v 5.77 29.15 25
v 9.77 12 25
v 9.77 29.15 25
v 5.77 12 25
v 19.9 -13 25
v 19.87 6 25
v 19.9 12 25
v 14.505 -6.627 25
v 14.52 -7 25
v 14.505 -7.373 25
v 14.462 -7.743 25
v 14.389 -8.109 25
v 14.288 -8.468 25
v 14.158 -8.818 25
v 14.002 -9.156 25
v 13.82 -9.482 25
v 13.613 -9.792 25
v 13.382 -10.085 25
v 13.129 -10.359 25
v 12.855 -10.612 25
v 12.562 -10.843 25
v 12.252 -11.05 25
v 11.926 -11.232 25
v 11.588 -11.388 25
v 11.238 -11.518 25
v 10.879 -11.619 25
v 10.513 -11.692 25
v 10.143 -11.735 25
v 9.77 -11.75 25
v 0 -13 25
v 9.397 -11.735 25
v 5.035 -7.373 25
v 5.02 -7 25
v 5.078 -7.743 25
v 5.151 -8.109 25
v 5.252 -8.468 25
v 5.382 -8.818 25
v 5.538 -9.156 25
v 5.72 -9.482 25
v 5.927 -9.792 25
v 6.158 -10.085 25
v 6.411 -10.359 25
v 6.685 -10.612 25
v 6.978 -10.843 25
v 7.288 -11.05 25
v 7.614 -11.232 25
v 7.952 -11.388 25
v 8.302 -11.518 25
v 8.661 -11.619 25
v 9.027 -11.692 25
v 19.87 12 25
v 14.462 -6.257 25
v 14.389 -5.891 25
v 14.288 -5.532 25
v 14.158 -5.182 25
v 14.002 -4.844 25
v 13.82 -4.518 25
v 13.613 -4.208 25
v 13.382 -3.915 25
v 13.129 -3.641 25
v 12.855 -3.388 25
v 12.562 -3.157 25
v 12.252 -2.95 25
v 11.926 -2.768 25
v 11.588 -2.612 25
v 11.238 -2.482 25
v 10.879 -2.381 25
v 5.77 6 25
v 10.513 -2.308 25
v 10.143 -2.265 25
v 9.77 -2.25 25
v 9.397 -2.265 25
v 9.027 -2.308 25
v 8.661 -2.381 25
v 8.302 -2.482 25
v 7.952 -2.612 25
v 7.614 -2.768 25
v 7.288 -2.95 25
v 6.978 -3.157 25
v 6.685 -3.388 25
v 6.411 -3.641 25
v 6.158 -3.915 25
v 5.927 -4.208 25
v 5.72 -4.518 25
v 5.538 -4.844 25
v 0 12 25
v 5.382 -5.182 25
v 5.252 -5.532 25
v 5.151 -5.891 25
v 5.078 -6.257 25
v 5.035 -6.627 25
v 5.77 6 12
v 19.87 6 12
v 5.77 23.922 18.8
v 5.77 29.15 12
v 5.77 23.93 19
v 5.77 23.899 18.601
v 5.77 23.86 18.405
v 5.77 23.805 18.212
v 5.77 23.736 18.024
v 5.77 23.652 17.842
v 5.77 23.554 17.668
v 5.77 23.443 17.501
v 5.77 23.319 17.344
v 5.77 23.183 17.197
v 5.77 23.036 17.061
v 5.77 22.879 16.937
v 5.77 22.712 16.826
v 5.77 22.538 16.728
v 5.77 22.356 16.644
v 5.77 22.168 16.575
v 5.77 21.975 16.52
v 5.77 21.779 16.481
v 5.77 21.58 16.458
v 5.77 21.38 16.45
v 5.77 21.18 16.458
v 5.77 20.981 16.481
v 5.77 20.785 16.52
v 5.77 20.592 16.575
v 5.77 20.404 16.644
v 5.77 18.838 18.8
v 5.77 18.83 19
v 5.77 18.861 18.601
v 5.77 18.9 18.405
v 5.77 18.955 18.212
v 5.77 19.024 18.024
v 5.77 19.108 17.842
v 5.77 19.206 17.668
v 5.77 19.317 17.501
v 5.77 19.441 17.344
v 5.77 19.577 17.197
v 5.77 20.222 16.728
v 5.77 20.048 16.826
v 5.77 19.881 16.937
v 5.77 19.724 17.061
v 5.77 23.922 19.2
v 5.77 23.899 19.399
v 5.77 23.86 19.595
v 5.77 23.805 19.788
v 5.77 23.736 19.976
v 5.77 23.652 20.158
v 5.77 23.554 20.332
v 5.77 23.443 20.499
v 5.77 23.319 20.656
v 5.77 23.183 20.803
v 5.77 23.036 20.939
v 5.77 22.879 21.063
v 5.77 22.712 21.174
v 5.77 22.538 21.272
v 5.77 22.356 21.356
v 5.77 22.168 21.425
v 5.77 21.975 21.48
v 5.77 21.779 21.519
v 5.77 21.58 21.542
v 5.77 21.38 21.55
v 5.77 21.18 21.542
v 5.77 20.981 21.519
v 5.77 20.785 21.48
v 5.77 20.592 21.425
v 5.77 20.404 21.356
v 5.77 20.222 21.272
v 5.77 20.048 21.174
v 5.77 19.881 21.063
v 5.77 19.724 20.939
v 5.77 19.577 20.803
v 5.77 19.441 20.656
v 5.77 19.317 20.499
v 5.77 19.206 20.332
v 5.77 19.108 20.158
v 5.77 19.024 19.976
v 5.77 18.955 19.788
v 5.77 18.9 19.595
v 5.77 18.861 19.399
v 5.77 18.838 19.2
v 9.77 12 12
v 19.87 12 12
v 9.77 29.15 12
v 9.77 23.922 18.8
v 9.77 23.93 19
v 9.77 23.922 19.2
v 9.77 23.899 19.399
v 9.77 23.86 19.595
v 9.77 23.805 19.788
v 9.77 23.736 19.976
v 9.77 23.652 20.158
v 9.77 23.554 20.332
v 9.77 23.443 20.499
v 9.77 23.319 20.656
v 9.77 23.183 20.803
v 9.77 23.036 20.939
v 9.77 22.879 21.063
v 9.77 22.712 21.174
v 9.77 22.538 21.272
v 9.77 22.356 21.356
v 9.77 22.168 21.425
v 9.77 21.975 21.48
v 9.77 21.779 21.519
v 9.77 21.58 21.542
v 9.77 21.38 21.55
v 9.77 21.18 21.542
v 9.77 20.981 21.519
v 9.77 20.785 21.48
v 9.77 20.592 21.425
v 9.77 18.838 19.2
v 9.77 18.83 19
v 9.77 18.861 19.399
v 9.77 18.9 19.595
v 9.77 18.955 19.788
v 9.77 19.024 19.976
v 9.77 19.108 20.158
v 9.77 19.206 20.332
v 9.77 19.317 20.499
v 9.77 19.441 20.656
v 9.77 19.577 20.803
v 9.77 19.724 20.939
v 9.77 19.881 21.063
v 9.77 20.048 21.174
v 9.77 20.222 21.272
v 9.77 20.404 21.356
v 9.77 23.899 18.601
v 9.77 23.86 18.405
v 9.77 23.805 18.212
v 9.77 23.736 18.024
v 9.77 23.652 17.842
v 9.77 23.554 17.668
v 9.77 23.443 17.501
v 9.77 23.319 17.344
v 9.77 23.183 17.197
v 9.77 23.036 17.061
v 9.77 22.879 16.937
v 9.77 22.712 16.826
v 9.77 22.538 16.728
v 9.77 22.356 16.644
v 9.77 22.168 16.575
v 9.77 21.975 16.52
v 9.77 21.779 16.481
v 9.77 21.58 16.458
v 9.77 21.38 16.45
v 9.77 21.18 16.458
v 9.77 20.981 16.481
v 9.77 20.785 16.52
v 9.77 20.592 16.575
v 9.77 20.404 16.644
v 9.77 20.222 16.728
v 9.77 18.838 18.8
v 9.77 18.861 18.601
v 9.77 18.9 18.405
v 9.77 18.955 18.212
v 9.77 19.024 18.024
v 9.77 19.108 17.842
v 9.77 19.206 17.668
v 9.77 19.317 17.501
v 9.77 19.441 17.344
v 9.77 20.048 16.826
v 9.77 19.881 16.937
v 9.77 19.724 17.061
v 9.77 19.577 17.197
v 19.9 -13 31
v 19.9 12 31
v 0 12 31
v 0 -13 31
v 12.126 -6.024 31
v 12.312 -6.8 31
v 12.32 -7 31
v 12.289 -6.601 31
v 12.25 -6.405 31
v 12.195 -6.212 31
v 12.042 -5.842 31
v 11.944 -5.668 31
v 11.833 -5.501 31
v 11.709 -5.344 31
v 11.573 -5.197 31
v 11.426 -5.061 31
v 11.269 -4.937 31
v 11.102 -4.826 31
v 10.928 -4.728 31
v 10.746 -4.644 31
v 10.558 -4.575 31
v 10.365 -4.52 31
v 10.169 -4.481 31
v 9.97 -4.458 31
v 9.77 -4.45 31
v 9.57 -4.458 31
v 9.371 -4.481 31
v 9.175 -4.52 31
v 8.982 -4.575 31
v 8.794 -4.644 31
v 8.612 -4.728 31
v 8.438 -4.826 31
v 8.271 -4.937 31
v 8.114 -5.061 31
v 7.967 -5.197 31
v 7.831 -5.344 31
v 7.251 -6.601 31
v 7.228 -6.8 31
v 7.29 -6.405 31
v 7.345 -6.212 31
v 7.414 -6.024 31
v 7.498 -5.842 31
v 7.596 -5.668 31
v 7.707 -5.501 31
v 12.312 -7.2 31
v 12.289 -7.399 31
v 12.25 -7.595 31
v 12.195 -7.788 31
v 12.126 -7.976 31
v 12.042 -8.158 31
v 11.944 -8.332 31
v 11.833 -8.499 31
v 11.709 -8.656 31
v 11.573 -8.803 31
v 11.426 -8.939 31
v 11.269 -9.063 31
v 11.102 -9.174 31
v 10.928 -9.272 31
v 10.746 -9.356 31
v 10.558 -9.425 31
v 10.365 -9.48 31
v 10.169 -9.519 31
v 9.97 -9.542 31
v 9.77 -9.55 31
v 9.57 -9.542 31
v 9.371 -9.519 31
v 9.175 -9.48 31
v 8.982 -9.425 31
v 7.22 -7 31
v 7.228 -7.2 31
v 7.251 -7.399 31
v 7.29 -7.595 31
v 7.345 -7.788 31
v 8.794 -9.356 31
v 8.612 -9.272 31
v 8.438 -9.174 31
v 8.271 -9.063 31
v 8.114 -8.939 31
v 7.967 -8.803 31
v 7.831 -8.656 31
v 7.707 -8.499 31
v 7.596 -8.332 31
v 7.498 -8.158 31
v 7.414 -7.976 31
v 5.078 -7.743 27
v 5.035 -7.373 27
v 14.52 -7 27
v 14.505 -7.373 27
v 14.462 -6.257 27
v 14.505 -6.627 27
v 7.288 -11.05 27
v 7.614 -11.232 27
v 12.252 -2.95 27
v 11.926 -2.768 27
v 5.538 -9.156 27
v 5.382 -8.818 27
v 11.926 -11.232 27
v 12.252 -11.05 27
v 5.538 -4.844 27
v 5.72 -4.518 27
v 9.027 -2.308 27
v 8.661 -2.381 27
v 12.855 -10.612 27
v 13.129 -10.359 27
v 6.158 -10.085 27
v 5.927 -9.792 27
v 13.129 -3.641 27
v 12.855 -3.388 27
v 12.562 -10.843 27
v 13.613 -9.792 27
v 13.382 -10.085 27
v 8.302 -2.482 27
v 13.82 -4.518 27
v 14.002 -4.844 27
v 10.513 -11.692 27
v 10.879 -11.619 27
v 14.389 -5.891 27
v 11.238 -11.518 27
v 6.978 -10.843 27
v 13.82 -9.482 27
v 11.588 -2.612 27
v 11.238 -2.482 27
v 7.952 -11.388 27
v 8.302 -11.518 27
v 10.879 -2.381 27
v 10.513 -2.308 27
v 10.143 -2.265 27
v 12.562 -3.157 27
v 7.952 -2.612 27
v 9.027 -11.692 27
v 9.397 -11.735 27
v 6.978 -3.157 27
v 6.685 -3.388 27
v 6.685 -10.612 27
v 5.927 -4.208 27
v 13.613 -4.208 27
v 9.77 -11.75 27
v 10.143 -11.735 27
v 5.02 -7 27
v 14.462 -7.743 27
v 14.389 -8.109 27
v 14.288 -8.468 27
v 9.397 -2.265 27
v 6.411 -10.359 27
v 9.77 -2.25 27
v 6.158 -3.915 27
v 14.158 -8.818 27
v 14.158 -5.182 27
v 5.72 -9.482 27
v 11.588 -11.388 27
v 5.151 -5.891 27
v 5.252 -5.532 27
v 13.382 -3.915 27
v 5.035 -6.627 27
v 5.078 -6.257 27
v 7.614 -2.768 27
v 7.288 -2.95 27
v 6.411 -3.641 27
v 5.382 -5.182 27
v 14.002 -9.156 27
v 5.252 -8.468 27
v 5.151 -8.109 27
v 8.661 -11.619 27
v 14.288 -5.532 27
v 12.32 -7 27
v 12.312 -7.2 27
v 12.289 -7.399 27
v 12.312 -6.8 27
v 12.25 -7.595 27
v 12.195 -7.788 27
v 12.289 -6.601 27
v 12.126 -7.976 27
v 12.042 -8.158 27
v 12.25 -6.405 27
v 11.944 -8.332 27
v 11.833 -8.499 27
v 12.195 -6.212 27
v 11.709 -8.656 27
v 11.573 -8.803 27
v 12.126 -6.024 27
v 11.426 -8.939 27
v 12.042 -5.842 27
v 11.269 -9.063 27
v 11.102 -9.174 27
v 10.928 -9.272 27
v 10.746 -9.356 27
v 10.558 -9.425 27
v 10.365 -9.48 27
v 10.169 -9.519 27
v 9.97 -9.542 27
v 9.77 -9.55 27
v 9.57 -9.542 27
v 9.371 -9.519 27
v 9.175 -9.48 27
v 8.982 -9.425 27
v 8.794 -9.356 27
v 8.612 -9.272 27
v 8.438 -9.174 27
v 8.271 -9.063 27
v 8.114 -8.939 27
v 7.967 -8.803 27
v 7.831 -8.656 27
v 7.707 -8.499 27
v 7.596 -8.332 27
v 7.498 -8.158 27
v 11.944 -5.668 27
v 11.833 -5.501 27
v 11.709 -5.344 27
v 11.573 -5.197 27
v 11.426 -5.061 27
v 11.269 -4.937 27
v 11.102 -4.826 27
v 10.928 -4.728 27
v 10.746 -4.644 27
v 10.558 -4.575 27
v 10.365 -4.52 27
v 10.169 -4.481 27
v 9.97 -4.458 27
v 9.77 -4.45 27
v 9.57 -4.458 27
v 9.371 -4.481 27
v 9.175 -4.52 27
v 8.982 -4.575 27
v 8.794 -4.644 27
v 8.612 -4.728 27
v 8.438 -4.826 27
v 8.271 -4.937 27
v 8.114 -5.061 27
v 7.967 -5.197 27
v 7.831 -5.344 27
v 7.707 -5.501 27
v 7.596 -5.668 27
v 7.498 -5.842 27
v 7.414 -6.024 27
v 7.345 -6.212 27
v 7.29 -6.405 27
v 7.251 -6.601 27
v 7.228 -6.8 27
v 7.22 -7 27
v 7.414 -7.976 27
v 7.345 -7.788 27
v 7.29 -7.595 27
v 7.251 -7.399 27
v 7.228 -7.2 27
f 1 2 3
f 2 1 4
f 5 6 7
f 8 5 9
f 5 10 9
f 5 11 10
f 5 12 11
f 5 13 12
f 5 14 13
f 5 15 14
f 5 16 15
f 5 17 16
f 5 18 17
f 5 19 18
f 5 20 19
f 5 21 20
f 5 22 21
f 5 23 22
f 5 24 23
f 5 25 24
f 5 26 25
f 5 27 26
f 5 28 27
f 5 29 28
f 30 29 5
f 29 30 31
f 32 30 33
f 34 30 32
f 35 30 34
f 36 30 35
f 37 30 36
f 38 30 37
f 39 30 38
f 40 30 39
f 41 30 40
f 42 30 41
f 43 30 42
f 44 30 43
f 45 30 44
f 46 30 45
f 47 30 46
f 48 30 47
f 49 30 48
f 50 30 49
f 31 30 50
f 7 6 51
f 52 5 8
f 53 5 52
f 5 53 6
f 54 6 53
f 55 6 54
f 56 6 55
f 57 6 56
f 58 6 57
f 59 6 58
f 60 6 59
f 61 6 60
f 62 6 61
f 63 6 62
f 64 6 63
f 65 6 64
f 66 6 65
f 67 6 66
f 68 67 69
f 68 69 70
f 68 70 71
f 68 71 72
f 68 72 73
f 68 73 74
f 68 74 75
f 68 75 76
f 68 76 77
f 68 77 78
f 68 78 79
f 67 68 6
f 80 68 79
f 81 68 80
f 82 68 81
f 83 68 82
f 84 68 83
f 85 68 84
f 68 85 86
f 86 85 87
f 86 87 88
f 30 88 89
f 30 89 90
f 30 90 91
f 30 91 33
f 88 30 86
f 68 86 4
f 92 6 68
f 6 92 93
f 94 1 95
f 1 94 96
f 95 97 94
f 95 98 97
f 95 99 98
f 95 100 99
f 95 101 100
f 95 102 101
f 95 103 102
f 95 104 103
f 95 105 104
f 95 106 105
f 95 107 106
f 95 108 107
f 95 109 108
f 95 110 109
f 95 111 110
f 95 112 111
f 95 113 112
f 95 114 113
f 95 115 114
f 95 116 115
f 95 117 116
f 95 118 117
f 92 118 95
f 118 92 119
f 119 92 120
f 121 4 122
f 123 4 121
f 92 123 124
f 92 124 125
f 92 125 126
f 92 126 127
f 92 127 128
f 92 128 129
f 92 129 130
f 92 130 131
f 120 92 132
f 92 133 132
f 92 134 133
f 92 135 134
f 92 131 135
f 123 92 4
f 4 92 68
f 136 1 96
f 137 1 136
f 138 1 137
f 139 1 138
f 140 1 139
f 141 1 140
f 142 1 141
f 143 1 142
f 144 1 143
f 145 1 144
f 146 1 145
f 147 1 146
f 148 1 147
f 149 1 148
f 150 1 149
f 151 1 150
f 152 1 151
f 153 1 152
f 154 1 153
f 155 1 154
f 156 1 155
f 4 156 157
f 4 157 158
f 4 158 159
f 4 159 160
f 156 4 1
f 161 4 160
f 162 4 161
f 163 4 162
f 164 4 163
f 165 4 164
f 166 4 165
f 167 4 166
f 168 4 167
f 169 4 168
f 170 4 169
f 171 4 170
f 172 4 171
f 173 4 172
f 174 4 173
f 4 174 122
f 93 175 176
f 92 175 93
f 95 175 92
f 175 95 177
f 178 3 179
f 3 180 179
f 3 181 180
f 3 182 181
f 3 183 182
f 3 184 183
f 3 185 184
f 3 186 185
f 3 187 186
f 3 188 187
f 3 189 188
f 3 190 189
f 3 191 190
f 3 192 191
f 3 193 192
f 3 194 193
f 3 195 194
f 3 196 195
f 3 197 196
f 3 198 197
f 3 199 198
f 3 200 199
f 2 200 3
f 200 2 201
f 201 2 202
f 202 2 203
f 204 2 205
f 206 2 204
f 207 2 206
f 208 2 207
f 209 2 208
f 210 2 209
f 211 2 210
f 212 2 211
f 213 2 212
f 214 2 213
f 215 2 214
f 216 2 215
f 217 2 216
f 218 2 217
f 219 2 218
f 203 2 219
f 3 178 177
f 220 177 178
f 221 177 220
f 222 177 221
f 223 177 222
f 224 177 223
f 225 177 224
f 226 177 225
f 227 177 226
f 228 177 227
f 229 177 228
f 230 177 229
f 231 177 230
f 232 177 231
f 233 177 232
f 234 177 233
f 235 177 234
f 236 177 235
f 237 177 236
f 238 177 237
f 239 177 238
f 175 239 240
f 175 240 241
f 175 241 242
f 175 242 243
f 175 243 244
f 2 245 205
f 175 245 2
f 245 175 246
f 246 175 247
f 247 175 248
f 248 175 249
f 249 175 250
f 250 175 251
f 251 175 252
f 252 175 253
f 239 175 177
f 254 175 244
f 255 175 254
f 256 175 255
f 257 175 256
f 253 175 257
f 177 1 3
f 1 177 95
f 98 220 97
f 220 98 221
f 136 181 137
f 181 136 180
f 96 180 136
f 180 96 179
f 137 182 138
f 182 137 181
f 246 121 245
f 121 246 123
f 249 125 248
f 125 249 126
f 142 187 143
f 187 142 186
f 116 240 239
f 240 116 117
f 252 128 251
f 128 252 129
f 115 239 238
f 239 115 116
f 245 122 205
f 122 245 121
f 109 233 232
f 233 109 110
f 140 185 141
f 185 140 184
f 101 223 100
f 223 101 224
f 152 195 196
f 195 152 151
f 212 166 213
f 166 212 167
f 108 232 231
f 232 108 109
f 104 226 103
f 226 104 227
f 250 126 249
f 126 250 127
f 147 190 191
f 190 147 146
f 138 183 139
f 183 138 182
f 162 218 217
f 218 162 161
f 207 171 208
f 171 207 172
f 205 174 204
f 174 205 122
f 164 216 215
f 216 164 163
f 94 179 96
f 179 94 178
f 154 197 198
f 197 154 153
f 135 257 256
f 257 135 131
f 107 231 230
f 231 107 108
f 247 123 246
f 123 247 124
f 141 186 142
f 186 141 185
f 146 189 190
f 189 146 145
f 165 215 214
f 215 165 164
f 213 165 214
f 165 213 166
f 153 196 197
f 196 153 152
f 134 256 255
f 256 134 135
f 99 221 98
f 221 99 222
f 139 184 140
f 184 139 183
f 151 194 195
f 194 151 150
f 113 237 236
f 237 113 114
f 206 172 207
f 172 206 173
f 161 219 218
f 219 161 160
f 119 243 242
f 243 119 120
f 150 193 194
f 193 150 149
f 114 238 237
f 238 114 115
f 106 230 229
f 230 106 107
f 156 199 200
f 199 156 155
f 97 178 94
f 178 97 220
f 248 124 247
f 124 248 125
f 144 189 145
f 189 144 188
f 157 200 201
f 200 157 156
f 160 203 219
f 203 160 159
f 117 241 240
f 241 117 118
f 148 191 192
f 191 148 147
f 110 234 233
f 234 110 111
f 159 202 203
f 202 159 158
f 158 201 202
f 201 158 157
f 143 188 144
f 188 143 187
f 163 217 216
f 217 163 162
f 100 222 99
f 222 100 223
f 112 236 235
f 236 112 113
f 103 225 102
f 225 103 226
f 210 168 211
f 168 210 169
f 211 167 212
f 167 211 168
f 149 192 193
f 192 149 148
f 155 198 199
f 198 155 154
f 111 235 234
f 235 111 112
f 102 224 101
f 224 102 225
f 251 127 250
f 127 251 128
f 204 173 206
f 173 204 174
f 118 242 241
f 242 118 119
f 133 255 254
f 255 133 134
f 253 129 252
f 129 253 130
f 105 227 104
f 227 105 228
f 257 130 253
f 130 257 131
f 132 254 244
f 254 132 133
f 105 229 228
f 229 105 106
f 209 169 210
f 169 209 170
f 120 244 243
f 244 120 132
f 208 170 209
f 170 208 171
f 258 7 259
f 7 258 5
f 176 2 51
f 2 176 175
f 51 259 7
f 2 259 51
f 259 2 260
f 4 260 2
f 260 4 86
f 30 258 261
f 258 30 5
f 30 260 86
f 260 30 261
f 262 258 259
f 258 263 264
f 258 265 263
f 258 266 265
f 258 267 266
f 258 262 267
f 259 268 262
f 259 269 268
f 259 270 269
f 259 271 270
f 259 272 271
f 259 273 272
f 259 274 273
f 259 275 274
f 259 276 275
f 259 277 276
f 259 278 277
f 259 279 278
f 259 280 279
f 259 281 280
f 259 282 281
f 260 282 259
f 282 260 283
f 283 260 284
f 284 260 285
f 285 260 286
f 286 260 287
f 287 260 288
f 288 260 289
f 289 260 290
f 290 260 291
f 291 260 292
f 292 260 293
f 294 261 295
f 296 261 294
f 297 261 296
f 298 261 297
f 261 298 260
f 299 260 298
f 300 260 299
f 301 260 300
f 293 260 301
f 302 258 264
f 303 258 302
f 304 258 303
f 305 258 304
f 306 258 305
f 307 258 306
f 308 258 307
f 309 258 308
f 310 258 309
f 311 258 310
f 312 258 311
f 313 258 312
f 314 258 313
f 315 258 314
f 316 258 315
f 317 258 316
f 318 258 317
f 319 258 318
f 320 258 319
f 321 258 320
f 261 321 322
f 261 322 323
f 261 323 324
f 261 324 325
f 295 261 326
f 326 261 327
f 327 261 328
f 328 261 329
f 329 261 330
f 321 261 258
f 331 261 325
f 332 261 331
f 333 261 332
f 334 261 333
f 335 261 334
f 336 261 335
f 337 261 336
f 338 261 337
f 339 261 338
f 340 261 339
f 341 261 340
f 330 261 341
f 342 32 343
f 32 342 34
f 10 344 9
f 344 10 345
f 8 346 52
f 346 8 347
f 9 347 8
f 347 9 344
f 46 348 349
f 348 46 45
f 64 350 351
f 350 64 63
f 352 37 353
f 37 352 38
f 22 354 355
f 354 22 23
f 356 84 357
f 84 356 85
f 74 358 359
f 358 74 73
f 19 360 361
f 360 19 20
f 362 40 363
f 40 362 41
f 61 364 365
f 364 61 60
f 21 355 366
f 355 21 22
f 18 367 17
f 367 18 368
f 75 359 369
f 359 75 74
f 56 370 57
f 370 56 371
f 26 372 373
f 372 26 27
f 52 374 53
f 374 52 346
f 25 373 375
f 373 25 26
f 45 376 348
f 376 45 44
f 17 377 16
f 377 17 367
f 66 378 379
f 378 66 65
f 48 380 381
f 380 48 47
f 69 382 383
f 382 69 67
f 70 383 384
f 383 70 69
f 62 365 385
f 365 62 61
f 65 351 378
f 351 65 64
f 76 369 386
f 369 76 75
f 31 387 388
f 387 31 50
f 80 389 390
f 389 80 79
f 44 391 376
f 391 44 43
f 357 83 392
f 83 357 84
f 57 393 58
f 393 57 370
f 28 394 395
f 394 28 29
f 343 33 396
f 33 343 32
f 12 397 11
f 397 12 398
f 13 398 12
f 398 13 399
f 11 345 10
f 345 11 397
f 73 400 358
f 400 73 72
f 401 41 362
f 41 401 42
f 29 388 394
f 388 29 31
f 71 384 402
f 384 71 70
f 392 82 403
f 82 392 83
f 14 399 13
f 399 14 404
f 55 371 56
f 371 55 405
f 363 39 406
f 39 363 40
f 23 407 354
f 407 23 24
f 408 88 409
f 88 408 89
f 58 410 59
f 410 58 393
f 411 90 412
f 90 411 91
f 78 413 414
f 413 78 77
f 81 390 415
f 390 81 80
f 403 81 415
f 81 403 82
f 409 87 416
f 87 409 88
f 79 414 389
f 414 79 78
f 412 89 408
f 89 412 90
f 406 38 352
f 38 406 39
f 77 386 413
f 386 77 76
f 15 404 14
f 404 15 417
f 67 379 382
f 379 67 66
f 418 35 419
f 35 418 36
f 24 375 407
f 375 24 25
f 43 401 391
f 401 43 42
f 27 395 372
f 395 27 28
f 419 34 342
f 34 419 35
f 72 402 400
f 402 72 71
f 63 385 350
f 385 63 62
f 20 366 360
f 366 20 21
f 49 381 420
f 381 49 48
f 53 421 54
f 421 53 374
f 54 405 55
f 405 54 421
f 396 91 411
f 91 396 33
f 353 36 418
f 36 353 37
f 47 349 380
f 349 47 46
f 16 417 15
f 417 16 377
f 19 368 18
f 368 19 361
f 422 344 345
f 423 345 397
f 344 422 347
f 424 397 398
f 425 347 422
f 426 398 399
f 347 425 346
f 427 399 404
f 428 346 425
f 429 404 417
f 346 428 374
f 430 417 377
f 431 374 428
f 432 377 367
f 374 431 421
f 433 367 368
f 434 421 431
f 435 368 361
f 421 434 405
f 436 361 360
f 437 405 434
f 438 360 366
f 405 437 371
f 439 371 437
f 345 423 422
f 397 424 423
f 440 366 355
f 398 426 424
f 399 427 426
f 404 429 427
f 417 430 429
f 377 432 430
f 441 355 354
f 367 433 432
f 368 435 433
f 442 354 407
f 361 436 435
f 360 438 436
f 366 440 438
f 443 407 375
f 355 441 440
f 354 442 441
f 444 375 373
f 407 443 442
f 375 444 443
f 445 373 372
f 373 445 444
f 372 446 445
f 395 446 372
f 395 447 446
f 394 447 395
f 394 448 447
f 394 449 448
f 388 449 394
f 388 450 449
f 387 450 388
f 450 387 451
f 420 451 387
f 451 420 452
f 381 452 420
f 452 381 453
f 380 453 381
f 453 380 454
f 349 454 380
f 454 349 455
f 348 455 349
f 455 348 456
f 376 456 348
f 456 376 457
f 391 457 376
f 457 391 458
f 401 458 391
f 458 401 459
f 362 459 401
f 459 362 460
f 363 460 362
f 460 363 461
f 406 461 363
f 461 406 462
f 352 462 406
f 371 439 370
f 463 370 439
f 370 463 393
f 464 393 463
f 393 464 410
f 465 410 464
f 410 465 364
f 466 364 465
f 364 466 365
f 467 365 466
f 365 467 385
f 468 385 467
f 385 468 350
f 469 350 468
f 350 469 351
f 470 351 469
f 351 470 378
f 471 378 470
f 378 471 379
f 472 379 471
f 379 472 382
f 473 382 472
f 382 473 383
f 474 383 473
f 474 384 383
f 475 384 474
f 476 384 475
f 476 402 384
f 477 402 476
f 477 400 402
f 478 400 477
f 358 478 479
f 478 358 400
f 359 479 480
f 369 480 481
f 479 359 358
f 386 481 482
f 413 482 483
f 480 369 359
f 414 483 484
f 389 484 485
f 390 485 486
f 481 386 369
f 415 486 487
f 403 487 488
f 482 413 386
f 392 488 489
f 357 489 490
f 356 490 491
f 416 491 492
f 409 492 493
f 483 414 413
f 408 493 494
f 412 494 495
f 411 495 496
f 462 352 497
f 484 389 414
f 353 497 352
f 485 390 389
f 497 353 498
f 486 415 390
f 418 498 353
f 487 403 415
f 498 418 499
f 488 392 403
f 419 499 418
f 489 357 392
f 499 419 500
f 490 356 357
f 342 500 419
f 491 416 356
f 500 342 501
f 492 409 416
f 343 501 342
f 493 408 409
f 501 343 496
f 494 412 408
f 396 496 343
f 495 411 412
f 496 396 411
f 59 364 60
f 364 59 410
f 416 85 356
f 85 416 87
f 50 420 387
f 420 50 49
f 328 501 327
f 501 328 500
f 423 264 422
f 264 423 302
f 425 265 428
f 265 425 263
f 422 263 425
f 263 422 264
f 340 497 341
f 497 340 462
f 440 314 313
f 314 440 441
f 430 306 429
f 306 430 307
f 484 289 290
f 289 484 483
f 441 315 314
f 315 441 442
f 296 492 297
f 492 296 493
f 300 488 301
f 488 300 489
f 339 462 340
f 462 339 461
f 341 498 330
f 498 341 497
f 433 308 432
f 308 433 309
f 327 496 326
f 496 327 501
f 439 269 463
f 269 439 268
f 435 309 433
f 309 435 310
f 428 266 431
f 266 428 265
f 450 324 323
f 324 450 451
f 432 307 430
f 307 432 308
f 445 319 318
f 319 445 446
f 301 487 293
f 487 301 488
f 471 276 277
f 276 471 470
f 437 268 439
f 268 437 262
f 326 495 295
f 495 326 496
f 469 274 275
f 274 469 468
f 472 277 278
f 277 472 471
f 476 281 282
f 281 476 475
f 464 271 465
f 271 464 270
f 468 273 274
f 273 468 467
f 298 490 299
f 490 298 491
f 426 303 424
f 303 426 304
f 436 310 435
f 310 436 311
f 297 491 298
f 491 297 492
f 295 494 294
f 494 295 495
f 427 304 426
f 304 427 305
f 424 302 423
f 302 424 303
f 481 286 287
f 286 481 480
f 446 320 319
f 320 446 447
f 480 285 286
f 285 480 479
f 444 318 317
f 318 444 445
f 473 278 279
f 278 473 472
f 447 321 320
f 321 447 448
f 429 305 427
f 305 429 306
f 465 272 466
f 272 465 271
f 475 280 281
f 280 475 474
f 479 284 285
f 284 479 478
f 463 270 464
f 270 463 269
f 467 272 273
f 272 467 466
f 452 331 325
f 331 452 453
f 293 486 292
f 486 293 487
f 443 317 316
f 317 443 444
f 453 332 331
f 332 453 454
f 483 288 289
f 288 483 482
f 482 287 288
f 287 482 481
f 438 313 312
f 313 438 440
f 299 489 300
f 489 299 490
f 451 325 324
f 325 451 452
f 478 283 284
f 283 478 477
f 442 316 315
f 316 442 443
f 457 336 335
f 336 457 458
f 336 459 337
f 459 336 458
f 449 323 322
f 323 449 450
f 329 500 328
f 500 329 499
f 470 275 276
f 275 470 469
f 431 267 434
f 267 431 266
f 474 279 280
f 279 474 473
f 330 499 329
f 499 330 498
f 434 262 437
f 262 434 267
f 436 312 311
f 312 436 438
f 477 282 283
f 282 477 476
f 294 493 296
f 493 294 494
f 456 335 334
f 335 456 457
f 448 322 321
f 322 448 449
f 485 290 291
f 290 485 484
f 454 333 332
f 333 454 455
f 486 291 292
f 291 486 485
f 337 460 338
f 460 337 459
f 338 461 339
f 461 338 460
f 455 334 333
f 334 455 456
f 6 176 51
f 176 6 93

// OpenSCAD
$fn=80;

//union for alu-profiles
union(){ 
difference(){
translate([9.77, 6, 12]) rotate([0, 0, 90]) cube([23.15 , 4, 13]);
//#translate([8.67, 21.38, 19]) rotate([90, 0, 90]) cylinder(d=9.50, h=5);
translate([3.87, 21.38, 19]) rotate([90, 0, 90]) cylinder(d=5.1, h=7);
}
translate([0,-13,31]) rotate([270,0,0]) difference(){
cube([19.9, 6, 25]);
translate([9.77, 9, 6]) rotate([90, 0, 0]) cylinder(d=9.50, h=5);
translate([9.77, 5, 6]) rotate([90, 0, 0]) cylinder(d=5.1, h=6);
}
translate([9.77, 6, 12]) cube([10.1, 6, 13]);
}
